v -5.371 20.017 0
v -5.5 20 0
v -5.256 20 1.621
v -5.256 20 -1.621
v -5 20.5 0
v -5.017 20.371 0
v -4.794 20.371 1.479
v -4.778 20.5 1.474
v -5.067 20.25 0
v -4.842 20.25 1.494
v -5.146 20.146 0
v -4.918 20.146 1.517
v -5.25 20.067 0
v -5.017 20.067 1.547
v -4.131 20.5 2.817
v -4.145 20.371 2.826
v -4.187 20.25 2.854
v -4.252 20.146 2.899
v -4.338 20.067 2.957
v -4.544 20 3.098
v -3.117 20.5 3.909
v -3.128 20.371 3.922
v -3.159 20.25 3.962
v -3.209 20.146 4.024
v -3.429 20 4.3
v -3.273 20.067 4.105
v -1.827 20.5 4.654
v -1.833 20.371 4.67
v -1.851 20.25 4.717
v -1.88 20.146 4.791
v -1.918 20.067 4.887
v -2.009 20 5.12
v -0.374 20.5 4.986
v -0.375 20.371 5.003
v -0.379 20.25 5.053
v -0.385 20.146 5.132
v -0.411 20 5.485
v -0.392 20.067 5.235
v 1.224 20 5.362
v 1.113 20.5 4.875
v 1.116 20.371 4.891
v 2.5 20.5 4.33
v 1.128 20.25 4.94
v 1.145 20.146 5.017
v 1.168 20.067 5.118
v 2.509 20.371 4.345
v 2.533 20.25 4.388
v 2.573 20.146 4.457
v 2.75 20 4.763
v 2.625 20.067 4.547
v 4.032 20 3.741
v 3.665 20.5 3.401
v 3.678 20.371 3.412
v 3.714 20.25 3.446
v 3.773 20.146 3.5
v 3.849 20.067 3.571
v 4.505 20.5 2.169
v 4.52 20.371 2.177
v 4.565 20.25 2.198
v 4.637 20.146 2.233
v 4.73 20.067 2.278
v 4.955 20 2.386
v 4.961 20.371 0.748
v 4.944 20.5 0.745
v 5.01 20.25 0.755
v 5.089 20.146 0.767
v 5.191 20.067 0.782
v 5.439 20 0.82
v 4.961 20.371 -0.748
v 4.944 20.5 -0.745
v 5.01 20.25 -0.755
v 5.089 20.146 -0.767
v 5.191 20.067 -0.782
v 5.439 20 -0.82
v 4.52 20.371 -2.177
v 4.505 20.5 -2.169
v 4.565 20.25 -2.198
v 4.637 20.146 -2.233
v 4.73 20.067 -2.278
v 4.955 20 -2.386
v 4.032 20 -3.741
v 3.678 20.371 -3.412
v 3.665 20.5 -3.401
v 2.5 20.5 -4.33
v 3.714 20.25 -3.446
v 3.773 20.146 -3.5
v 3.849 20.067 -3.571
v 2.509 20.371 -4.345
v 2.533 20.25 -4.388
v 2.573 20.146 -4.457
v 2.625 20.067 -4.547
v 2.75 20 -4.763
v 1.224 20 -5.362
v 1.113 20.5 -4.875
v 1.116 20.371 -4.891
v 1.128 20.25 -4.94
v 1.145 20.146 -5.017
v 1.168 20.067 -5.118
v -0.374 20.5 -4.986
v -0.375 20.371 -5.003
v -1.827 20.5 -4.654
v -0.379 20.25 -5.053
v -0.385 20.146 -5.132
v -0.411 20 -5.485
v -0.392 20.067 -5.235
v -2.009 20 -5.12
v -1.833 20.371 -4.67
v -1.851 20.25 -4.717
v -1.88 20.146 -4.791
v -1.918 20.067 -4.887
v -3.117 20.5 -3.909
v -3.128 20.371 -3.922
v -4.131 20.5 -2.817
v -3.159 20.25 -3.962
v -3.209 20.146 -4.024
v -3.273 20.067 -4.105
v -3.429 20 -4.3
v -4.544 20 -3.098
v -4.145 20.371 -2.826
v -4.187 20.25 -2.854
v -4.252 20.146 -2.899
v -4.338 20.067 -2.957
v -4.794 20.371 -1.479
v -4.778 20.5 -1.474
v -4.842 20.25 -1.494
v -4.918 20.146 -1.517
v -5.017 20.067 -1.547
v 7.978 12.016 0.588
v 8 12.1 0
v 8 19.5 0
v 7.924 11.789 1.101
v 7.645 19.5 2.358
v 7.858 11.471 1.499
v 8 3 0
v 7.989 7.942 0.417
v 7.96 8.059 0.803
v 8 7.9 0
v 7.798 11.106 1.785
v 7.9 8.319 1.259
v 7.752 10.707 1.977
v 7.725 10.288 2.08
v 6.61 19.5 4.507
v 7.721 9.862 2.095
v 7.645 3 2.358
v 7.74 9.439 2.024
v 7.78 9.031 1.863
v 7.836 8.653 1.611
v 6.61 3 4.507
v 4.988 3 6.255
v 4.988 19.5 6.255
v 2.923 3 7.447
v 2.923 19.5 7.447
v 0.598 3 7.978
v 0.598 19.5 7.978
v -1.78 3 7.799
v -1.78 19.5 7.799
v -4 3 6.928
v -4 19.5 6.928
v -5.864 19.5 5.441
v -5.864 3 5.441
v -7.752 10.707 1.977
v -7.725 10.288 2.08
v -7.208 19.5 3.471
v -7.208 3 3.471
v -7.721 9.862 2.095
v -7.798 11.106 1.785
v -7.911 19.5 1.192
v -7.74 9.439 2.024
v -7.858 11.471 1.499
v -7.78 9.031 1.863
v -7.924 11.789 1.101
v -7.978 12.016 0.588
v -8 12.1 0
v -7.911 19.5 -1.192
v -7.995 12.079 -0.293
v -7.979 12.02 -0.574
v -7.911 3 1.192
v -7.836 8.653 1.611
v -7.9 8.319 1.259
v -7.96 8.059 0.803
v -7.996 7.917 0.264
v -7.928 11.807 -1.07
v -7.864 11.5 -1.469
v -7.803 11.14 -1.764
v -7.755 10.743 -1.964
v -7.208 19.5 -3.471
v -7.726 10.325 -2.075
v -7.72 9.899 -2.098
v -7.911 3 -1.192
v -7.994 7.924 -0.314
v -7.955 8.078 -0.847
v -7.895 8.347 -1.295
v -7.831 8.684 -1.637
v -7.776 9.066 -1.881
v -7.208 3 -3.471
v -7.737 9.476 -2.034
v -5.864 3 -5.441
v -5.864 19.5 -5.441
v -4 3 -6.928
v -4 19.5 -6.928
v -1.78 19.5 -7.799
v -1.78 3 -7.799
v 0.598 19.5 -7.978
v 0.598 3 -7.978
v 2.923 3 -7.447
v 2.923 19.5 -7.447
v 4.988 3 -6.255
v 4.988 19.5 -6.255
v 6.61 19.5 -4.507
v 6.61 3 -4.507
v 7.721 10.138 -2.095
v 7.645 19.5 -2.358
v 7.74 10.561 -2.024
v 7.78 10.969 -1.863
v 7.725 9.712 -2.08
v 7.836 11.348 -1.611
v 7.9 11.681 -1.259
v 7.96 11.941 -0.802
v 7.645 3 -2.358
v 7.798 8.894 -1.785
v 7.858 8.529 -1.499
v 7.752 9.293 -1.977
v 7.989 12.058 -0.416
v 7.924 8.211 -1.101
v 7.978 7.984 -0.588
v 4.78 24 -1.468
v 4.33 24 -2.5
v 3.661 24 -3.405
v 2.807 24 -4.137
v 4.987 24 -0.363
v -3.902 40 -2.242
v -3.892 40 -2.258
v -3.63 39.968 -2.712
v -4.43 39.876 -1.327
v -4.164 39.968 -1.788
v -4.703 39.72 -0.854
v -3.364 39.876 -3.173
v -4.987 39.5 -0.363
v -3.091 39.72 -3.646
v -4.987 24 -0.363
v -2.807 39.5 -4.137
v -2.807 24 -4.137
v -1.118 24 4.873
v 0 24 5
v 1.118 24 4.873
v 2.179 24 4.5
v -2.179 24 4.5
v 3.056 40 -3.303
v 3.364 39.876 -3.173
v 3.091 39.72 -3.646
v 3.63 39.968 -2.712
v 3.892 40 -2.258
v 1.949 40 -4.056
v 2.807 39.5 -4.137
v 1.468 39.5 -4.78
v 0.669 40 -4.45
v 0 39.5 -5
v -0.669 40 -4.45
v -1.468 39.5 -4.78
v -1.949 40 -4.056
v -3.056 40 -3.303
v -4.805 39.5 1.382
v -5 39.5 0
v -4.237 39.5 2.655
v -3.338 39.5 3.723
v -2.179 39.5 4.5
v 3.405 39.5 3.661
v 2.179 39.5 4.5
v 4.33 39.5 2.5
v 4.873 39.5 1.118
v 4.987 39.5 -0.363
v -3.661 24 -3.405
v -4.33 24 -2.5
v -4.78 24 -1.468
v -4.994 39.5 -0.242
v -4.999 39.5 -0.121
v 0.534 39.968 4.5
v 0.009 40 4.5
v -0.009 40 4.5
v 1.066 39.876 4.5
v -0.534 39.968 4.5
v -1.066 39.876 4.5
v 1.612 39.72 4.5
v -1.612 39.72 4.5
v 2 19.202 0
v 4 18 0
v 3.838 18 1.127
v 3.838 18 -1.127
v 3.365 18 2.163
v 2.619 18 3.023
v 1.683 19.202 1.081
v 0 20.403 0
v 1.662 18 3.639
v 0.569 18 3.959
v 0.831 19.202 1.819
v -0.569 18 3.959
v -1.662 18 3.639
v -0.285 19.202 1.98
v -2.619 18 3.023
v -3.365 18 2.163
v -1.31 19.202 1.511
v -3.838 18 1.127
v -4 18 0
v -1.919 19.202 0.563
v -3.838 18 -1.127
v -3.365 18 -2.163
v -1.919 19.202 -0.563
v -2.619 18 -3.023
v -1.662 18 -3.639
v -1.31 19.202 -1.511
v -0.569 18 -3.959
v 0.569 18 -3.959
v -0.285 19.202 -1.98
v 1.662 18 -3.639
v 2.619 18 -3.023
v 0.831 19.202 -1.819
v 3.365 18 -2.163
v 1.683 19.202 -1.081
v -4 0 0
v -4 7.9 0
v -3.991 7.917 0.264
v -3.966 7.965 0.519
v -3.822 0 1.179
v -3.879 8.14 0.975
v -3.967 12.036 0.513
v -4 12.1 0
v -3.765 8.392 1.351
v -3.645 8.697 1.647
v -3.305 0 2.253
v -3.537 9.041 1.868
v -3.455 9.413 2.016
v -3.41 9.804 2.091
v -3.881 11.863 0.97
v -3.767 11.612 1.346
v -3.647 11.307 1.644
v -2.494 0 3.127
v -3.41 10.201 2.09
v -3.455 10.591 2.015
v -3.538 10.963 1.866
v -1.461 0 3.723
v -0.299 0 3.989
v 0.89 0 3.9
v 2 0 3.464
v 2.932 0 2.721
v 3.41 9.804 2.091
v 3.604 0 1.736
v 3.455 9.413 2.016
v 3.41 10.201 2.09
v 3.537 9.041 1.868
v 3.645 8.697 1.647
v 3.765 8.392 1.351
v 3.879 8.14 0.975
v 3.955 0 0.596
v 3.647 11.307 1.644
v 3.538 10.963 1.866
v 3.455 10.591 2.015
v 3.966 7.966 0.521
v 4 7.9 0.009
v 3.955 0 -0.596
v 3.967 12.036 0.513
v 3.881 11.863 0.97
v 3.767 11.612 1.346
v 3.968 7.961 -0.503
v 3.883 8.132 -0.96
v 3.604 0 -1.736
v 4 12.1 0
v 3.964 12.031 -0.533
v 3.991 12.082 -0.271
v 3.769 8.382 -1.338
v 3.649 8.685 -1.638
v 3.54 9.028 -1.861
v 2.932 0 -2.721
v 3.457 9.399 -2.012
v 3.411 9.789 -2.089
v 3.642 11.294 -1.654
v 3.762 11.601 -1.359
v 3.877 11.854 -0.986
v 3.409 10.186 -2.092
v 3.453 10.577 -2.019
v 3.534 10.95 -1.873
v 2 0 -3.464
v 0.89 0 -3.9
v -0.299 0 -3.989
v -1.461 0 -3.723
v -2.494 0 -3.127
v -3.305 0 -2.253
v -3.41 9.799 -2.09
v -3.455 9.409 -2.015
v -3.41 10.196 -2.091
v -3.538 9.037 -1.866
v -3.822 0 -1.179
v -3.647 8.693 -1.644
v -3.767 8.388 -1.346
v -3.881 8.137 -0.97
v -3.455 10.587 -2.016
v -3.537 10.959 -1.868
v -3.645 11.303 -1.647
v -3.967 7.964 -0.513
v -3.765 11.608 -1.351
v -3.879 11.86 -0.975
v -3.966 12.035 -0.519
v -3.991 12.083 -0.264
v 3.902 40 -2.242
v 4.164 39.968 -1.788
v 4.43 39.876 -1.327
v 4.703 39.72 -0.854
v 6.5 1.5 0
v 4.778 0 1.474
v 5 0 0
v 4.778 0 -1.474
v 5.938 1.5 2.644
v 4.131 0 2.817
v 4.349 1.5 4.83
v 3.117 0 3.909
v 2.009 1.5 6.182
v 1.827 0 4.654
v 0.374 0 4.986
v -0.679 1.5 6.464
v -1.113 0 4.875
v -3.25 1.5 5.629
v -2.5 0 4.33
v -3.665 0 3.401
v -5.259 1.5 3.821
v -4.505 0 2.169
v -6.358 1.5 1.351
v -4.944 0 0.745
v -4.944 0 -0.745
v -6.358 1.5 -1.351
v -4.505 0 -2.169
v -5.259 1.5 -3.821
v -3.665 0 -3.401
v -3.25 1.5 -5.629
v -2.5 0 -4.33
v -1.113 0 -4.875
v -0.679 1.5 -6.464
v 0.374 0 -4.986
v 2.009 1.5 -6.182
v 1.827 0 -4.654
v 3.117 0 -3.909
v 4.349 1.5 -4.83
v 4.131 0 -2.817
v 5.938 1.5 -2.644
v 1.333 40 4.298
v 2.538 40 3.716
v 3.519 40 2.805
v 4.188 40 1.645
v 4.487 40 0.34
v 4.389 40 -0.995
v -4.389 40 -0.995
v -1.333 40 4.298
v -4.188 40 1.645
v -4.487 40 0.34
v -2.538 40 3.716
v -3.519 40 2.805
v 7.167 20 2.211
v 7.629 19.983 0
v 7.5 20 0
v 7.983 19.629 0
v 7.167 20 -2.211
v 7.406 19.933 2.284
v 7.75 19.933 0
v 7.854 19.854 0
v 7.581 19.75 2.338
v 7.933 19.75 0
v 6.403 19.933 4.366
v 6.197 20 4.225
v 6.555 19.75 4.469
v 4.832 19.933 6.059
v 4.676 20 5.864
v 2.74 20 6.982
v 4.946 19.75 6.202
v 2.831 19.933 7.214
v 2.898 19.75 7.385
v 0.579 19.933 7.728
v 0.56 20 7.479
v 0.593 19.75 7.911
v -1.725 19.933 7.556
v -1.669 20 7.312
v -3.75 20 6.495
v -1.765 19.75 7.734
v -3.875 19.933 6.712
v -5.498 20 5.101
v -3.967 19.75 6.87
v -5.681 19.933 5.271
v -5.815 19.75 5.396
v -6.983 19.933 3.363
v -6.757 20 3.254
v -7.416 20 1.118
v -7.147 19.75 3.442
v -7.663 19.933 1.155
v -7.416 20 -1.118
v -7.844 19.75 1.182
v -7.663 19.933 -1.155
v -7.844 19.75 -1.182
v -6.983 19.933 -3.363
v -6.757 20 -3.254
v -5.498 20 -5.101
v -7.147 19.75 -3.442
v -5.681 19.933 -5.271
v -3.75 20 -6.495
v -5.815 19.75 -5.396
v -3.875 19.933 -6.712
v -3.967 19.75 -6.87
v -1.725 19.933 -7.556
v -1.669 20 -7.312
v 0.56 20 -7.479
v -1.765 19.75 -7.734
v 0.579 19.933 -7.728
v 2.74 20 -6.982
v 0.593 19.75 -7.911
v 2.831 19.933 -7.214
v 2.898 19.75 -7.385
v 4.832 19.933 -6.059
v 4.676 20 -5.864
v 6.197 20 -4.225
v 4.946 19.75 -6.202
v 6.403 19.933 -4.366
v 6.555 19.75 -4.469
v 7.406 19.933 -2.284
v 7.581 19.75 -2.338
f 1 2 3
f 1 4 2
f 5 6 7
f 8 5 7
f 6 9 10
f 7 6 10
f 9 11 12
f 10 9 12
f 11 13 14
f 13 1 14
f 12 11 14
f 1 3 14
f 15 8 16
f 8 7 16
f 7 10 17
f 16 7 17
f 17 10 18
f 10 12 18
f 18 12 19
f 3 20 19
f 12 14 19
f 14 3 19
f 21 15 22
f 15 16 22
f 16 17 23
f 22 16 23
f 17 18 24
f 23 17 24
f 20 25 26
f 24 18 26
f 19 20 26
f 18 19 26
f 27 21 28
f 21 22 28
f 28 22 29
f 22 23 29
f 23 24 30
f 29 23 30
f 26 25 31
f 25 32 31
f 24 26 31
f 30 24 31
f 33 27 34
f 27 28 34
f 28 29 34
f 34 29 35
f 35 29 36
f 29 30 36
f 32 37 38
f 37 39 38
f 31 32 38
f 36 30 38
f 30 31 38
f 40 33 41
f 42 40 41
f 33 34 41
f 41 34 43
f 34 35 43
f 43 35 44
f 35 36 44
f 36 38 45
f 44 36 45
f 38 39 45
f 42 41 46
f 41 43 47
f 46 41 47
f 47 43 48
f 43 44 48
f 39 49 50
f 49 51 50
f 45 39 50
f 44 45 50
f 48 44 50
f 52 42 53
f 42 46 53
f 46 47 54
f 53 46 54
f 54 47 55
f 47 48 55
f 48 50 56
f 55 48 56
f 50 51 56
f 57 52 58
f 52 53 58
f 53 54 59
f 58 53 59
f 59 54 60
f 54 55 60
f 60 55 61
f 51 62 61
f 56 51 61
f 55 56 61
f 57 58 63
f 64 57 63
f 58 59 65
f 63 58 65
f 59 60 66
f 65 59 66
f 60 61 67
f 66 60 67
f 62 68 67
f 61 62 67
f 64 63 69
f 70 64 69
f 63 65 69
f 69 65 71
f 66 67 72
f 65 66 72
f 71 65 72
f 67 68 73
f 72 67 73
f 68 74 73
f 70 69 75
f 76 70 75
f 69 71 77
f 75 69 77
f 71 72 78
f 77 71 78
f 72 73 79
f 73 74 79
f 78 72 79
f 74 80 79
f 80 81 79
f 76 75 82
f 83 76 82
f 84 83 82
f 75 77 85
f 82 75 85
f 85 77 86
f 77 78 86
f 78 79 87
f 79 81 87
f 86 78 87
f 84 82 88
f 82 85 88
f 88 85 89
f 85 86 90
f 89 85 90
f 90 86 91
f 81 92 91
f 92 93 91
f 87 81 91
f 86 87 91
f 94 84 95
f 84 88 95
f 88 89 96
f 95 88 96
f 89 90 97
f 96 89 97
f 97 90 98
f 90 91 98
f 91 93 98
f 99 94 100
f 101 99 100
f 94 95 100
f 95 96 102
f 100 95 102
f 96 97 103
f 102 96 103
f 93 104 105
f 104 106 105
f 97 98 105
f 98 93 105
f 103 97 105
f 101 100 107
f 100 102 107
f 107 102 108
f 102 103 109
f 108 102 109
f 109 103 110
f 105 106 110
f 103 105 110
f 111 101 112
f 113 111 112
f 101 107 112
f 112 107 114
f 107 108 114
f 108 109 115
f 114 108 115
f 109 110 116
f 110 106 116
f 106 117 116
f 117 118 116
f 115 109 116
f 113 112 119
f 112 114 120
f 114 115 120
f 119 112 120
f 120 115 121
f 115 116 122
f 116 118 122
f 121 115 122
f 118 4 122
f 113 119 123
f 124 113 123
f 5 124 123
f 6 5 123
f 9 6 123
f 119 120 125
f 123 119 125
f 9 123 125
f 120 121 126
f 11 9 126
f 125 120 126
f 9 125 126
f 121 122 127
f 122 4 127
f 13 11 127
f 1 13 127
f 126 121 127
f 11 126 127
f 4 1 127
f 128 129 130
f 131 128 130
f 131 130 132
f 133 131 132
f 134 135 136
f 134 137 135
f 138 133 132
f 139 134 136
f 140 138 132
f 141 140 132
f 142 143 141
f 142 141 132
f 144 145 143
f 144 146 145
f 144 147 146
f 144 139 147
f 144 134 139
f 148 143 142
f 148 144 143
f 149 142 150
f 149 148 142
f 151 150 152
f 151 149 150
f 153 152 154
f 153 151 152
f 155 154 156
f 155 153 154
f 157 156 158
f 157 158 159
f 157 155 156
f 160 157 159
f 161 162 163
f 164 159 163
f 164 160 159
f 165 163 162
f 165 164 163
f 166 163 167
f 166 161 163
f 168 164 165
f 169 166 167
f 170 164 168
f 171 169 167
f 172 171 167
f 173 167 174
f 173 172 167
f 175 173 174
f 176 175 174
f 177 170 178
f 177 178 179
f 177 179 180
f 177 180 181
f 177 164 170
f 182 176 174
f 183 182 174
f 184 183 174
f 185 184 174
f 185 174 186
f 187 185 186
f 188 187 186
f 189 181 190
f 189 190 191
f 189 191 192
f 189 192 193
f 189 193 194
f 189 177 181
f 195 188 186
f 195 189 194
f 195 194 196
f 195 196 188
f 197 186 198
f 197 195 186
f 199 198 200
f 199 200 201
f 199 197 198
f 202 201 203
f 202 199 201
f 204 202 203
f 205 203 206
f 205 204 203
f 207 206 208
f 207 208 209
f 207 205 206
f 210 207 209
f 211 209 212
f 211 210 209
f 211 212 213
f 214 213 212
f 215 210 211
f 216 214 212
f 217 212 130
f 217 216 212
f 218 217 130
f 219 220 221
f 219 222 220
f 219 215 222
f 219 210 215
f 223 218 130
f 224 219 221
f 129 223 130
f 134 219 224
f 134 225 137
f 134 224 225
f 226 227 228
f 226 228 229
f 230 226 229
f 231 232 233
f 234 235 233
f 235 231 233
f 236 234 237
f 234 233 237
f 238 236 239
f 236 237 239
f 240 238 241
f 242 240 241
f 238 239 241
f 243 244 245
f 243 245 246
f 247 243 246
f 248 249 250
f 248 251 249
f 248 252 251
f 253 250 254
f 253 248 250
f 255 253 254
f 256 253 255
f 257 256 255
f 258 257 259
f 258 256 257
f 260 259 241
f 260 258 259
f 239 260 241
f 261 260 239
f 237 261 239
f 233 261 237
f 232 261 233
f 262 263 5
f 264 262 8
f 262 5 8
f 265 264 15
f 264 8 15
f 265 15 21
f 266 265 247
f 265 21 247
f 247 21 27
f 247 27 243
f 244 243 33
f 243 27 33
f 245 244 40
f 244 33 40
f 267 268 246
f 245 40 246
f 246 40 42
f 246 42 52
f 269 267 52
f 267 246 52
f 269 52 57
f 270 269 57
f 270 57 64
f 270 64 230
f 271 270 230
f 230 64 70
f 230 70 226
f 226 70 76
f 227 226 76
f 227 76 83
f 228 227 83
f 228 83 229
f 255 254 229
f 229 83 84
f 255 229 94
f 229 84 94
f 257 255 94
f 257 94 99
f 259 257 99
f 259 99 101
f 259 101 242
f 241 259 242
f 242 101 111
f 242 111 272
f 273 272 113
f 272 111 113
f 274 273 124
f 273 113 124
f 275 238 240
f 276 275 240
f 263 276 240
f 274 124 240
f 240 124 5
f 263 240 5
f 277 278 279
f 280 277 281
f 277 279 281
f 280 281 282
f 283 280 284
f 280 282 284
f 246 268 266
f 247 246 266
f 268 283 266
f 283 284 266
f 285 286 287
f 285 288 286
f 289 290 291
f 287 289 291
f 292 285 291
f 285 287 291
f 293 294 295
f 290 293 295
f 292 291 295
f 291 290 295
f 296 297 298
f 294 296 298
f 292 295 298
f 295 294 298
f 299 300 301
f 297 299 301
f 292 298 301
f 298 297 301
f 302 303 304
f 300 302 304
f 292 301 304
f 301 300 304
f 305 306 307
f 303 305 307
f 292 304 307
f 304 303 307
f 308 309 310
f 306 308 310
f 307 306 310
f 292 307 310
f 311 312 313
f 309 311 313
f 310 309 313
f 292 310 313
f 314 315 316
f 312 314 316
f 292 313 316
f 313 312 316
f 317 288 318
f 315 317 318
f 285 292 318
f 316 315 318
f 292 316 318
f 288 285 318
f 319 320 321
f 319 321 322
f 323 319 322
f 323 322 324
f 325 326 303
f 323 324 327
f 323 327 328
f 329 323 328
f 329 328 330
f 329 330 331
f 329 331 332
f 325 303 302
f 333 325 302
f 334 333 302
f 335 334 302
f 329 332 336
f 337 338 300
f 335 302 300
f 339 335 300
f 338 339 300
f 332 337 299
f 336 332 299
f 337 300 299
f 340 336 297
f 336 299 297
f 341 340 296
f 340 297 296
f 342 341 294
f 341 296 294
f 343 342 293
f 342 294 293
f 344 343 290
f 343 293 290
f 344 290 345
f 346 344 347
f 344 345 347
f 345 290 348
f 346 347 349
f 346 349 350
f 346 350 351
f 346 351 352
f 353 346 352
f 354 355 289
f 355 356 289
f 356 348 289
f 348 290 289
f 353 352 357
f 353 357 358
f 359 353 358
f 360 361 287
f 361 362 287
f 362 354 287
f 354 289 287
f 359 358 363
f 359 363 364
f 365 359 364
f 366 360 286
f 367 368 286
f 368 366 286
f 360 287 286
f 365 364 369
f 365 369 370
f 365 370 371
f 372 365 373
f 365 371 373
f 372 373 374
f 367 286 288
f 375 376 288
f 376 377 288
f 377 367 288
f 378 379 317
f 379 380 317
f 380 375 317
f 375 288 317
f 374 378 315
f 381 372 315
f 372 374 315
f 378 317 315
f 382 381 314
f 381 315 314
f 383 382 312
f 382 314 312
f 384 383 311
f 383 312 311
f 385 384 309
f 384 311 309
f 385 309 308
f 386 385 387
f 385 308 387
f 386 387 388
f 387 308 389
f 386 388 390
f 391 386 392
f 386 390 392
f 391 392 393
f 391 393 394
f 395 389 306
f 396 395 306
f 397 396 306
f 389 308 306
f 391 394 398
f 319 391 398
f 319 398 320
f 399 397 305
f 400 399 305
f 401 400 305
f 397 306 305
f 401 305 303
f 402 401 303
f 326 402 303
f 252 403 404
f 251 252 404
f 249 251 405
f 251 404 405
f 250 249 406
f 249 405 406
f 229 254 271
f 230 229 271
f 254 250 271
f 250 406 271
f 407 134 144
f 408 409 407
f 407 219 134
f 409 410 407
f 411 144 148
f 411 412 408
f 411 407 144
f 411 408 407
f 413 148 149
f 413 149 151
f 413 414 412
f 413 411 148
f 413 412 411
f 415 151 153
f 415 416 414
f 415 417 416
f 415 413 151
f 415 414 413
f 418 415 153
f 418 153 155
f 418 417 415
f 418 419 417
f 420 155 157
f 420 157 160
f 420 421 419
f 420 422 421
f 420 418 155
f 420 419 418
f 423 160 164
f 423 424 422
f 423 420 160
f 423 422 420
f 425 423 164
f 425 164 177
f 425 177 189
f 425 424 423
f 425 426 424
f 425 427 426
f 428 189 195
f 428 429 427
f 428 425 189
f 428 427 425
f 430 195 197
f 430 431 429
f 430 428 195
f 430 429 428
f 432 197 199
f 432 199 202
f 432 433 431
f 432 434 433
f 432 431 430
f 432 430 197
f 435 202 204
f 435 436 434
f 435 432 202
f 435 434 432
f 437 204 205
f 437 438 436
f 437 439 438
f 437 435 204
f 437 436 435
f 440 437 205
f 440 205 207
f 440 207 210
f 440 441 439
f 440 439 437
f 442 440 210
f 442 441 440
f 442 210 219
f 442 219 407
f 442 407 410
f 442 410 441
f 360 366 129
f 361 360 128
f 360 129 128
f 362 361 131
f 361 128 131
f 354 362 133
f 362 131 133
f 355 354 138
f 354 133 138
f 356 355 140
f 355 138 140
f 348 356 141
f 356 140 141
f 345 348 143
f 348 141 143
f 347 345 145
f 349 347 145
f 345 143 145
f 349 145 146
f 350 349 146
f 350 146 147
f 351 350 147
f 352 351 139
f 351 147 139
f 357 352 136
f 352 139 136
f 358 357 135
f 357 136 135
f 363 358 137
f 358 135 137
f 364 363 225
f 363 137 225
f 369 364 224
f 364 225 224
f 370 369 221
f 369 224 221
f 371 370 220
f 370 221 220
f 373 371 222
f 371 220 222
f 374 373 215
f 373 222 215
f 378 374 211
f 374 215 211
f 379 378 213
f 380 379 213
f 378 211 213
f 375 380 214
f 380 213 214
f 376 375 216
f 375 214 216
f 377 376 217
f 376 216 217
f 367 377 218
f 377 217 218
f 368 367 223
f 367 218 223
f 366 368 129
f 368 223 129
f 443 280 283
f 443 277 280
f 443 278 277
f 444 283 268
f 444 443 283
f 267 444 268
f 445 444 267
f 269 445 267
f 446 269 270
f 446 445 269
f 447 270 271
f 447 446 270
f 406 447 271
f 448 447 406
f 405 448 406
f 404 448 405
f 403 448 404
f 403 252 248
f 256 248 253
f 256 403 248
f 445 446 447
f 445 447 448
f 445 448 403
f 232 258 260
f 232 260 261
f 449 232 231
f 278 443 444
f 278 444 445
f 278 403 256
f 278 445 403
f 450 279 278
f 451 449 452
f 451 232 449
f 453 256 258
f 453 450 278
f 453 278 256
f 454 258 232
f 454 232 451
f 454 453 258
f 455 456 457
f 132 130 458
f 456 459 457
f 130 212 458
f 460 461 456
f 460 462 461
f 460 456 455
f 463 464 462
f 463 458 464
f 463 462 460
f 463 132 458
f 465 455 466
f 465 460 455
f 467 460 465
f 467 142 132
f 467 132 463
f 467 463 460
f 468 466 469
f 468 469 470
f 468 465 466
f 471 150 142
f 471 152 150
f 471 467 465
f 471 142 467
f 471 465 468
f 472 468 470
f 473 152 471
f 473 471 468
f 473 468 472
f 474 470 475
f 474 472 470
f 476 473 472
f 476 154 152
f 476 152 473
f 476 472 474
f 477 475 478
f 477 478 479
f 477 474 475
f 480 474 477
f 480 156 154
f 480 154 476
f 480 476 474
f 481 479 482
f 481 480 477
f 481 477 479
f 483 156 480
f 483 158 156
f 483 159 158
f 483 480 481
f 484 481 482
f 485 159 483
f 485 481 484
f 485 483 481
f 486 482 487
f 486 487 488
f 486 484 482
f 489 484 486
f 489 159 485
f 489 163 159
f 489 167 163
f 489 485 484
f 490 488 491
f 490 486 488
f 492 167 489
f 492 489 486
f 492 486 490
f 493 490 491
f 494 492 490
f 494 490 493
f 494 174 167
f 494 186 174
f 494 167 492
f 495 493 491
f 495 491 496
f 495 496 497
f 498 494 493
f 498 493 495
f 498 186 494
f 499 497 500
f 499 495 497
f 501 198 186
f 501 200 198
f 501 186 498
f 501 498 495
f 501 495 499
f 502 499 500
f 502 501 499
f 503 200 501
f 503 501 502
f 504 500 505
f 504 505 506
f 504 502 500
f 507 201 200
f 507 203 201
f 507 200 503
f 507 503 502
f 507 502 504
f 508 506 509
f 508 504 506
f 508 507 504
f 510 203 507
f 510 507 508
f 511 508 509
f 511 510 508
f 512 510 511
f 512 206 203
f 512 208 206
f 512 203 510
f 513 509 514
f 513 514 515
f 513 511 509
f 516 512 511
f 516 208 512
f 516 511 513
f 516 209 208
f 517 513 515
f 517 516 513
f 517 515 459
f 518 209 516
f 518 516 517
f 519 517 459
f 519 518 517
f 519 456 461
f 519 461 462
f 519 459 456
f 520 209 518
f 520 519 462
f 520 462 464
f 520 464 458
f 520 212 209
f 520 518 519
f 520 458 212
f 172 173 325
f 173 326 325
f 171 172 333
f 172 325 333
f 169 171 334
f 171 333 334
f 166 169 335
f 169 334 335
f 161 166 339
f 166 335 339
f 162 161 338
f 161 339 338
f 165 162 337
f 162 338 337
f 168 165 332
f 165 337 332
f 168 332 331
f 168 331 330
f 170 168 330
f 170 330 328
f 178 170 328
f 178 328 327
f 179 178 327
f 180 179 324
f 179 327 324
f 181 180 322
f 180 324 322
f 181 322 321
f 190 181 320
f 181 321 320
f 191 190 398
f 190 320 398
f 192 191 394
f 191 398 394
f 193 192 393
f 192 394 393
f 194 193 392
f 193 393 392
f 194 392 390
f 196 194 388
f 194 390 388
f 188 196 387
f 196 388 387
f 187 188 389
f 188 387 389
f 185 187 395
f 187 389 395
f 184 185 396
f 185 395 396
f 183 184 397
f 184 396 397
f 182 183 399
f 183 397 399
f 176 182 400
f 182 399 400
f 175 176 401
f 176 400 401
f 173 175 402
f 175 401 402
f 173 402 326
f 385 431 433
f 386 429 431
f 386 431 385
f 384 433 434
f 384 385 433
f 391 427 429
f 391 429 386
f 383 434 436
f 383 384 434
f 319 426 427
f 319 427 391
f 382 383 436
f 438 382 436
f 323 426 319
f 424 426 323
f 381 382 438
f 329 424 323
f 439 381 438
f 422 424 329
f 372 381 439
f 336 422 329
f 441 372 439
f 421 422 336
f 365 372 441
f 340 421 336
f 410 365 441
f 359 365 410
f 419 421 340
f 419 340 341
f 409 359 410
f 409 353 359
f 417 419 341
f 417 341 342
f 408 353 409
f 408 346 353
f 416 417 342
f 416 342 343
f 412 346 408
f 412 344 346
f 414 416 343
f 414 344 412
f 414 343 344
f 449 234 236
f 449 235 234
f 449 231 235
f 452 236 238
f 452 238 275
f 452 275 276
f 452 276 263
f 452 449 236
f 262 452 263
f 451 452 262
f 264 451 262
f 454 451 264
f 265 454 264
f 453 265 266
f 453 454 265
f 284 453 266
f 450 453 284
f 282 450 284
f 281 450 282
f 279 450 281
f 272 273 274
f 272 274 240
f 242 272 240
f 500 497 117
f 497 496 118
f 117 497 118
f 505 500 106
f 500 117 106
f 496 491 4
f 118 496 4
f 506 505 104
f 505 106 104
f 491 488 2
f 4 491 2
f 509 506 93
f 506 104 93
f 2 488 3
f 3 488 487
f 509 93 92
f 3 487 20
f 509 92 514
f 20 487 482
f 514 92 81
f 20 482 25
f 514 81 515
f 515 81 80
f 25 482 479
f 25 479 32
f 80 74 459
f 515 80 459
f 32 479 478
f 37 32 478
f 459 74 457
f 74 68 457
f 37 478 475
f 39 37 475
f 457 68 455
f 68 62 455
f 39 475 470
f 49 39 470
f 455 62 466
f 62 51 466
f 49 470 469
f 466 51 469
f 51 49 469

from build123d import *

# Parameters (mm, degrees)
F0_R            = 8
F1_DEPTH        = 20
F2_R            = 5
F3_DEPTH        = 20
F5_DEPTH        = 16
F5_COPIES_COUNT = 3
F6_SIZE         = 0.49999
F7_R            = 0.5
F9_D            = 8
F9_DEPTH        = 18
F9_TIP          = 2.4034424761
F10_R           = 2.1
F11_DEPTH       = 8.25
F12_SIZE        = 3


# Not quite as in the source:
# - a fillet or chamfer is up to 0.001 mm smaller than in the source, because OpenCascade refuses the exact size
# - a pattern or mirror of a feature is missing from the dataset's text; its kind, count and spacing are read off the source's solid


with BuildPart() as f1:
    # F0 (on Front) → F1 (new body)
    with BuildSketch(Plane.XZ):
        Circle(F0_R)
    extrude(amount=-F1_DEPTH)

    # F2 (on face) → F3 (join)
    with BuildSketch(Plane(origin=(0, 20, 0), x_dir=(-1, 0, 0), z_dir=(0, 1, 0))):
        Circle(F2_R)
    extrude(amount=F3_DEPTH)

    # F4 (on face) → F5 (cut)
    with BuildSketch(Plane(origin=(0, 40, 0), x_dir=(-1, 0, 0), z_dir=(0, 1, 0))):
        with BuildLine():
            ThreePointArc((2.1794494718, 4.5), (0, 5), (-2.1794494718, 4.5))
            Line((-2.1794494718, 4.5), (2.1794494718, 4.5))
        make_face()
    f5 = extrude(amount=-F5_DEPTH, mode=Mode.SUBTRACT)

    # F5_copies: F5 ×3 about axis
    f5_copies_axis = Axis((0, 0, 0), (0, 1, 0))
    for i in range(1, F5_COPIES_COUNT):
        add(f5.rotate(f5_copies_axis, i * 360 / F5_COPIES_COUNT), mode=Mode.SUBTRACT)

    # F6 (size 0.5 in the source; OpenCascade refuses exactly that, so slightly less here)
    f6_edges = [f1.edges().sort_by_distance(p)[0] for p in [
        (4.330127, 40, 2.5),
        (-4.996709, 40, -0.18139),
        (0, 40, -5),
        (-4.236582, 40, 2.655443),
    ]]
    chamfer(f6_edges, length=F6_SIZE)

    # F7
    f7_edges = [f1.edges().sort_by_distance(p)[0] for p in [
        (-8, 20, 0),
        (5, 20, 0),
    ]]
    fillet(f7_edges, radius=F7_R)

    # F9
    with Locations(Plane.XZ):
        with Locations((0, 0)):
            Hole(F9_D / 2, depth=F9_DEPTH)
            with Locations((0, 0, -(F9_DEPTH + F9_TIP / 2))):  # 118° drill point
                Cone(0, F9_D / 2, F9_TIP, mode=Mode.SUBTRACT)

    # F10 (on Right) → F11 (cut, symmetric)
    with BuildSketch(Plane.YZ):
        with Locations((10, 0)):
            Circle(F10_R)
    extrude(amount=F11_DEPTH, both=True, mode=Mode.SUBTRACT)

    # F12
    f12_edges = [f1.edges().sort_by_distance(p)[0] for p in [
        (-8, 0, 0),
    ]]
    chamfer(f12_edges, length=F12_SIZE)


solid = f1.part
